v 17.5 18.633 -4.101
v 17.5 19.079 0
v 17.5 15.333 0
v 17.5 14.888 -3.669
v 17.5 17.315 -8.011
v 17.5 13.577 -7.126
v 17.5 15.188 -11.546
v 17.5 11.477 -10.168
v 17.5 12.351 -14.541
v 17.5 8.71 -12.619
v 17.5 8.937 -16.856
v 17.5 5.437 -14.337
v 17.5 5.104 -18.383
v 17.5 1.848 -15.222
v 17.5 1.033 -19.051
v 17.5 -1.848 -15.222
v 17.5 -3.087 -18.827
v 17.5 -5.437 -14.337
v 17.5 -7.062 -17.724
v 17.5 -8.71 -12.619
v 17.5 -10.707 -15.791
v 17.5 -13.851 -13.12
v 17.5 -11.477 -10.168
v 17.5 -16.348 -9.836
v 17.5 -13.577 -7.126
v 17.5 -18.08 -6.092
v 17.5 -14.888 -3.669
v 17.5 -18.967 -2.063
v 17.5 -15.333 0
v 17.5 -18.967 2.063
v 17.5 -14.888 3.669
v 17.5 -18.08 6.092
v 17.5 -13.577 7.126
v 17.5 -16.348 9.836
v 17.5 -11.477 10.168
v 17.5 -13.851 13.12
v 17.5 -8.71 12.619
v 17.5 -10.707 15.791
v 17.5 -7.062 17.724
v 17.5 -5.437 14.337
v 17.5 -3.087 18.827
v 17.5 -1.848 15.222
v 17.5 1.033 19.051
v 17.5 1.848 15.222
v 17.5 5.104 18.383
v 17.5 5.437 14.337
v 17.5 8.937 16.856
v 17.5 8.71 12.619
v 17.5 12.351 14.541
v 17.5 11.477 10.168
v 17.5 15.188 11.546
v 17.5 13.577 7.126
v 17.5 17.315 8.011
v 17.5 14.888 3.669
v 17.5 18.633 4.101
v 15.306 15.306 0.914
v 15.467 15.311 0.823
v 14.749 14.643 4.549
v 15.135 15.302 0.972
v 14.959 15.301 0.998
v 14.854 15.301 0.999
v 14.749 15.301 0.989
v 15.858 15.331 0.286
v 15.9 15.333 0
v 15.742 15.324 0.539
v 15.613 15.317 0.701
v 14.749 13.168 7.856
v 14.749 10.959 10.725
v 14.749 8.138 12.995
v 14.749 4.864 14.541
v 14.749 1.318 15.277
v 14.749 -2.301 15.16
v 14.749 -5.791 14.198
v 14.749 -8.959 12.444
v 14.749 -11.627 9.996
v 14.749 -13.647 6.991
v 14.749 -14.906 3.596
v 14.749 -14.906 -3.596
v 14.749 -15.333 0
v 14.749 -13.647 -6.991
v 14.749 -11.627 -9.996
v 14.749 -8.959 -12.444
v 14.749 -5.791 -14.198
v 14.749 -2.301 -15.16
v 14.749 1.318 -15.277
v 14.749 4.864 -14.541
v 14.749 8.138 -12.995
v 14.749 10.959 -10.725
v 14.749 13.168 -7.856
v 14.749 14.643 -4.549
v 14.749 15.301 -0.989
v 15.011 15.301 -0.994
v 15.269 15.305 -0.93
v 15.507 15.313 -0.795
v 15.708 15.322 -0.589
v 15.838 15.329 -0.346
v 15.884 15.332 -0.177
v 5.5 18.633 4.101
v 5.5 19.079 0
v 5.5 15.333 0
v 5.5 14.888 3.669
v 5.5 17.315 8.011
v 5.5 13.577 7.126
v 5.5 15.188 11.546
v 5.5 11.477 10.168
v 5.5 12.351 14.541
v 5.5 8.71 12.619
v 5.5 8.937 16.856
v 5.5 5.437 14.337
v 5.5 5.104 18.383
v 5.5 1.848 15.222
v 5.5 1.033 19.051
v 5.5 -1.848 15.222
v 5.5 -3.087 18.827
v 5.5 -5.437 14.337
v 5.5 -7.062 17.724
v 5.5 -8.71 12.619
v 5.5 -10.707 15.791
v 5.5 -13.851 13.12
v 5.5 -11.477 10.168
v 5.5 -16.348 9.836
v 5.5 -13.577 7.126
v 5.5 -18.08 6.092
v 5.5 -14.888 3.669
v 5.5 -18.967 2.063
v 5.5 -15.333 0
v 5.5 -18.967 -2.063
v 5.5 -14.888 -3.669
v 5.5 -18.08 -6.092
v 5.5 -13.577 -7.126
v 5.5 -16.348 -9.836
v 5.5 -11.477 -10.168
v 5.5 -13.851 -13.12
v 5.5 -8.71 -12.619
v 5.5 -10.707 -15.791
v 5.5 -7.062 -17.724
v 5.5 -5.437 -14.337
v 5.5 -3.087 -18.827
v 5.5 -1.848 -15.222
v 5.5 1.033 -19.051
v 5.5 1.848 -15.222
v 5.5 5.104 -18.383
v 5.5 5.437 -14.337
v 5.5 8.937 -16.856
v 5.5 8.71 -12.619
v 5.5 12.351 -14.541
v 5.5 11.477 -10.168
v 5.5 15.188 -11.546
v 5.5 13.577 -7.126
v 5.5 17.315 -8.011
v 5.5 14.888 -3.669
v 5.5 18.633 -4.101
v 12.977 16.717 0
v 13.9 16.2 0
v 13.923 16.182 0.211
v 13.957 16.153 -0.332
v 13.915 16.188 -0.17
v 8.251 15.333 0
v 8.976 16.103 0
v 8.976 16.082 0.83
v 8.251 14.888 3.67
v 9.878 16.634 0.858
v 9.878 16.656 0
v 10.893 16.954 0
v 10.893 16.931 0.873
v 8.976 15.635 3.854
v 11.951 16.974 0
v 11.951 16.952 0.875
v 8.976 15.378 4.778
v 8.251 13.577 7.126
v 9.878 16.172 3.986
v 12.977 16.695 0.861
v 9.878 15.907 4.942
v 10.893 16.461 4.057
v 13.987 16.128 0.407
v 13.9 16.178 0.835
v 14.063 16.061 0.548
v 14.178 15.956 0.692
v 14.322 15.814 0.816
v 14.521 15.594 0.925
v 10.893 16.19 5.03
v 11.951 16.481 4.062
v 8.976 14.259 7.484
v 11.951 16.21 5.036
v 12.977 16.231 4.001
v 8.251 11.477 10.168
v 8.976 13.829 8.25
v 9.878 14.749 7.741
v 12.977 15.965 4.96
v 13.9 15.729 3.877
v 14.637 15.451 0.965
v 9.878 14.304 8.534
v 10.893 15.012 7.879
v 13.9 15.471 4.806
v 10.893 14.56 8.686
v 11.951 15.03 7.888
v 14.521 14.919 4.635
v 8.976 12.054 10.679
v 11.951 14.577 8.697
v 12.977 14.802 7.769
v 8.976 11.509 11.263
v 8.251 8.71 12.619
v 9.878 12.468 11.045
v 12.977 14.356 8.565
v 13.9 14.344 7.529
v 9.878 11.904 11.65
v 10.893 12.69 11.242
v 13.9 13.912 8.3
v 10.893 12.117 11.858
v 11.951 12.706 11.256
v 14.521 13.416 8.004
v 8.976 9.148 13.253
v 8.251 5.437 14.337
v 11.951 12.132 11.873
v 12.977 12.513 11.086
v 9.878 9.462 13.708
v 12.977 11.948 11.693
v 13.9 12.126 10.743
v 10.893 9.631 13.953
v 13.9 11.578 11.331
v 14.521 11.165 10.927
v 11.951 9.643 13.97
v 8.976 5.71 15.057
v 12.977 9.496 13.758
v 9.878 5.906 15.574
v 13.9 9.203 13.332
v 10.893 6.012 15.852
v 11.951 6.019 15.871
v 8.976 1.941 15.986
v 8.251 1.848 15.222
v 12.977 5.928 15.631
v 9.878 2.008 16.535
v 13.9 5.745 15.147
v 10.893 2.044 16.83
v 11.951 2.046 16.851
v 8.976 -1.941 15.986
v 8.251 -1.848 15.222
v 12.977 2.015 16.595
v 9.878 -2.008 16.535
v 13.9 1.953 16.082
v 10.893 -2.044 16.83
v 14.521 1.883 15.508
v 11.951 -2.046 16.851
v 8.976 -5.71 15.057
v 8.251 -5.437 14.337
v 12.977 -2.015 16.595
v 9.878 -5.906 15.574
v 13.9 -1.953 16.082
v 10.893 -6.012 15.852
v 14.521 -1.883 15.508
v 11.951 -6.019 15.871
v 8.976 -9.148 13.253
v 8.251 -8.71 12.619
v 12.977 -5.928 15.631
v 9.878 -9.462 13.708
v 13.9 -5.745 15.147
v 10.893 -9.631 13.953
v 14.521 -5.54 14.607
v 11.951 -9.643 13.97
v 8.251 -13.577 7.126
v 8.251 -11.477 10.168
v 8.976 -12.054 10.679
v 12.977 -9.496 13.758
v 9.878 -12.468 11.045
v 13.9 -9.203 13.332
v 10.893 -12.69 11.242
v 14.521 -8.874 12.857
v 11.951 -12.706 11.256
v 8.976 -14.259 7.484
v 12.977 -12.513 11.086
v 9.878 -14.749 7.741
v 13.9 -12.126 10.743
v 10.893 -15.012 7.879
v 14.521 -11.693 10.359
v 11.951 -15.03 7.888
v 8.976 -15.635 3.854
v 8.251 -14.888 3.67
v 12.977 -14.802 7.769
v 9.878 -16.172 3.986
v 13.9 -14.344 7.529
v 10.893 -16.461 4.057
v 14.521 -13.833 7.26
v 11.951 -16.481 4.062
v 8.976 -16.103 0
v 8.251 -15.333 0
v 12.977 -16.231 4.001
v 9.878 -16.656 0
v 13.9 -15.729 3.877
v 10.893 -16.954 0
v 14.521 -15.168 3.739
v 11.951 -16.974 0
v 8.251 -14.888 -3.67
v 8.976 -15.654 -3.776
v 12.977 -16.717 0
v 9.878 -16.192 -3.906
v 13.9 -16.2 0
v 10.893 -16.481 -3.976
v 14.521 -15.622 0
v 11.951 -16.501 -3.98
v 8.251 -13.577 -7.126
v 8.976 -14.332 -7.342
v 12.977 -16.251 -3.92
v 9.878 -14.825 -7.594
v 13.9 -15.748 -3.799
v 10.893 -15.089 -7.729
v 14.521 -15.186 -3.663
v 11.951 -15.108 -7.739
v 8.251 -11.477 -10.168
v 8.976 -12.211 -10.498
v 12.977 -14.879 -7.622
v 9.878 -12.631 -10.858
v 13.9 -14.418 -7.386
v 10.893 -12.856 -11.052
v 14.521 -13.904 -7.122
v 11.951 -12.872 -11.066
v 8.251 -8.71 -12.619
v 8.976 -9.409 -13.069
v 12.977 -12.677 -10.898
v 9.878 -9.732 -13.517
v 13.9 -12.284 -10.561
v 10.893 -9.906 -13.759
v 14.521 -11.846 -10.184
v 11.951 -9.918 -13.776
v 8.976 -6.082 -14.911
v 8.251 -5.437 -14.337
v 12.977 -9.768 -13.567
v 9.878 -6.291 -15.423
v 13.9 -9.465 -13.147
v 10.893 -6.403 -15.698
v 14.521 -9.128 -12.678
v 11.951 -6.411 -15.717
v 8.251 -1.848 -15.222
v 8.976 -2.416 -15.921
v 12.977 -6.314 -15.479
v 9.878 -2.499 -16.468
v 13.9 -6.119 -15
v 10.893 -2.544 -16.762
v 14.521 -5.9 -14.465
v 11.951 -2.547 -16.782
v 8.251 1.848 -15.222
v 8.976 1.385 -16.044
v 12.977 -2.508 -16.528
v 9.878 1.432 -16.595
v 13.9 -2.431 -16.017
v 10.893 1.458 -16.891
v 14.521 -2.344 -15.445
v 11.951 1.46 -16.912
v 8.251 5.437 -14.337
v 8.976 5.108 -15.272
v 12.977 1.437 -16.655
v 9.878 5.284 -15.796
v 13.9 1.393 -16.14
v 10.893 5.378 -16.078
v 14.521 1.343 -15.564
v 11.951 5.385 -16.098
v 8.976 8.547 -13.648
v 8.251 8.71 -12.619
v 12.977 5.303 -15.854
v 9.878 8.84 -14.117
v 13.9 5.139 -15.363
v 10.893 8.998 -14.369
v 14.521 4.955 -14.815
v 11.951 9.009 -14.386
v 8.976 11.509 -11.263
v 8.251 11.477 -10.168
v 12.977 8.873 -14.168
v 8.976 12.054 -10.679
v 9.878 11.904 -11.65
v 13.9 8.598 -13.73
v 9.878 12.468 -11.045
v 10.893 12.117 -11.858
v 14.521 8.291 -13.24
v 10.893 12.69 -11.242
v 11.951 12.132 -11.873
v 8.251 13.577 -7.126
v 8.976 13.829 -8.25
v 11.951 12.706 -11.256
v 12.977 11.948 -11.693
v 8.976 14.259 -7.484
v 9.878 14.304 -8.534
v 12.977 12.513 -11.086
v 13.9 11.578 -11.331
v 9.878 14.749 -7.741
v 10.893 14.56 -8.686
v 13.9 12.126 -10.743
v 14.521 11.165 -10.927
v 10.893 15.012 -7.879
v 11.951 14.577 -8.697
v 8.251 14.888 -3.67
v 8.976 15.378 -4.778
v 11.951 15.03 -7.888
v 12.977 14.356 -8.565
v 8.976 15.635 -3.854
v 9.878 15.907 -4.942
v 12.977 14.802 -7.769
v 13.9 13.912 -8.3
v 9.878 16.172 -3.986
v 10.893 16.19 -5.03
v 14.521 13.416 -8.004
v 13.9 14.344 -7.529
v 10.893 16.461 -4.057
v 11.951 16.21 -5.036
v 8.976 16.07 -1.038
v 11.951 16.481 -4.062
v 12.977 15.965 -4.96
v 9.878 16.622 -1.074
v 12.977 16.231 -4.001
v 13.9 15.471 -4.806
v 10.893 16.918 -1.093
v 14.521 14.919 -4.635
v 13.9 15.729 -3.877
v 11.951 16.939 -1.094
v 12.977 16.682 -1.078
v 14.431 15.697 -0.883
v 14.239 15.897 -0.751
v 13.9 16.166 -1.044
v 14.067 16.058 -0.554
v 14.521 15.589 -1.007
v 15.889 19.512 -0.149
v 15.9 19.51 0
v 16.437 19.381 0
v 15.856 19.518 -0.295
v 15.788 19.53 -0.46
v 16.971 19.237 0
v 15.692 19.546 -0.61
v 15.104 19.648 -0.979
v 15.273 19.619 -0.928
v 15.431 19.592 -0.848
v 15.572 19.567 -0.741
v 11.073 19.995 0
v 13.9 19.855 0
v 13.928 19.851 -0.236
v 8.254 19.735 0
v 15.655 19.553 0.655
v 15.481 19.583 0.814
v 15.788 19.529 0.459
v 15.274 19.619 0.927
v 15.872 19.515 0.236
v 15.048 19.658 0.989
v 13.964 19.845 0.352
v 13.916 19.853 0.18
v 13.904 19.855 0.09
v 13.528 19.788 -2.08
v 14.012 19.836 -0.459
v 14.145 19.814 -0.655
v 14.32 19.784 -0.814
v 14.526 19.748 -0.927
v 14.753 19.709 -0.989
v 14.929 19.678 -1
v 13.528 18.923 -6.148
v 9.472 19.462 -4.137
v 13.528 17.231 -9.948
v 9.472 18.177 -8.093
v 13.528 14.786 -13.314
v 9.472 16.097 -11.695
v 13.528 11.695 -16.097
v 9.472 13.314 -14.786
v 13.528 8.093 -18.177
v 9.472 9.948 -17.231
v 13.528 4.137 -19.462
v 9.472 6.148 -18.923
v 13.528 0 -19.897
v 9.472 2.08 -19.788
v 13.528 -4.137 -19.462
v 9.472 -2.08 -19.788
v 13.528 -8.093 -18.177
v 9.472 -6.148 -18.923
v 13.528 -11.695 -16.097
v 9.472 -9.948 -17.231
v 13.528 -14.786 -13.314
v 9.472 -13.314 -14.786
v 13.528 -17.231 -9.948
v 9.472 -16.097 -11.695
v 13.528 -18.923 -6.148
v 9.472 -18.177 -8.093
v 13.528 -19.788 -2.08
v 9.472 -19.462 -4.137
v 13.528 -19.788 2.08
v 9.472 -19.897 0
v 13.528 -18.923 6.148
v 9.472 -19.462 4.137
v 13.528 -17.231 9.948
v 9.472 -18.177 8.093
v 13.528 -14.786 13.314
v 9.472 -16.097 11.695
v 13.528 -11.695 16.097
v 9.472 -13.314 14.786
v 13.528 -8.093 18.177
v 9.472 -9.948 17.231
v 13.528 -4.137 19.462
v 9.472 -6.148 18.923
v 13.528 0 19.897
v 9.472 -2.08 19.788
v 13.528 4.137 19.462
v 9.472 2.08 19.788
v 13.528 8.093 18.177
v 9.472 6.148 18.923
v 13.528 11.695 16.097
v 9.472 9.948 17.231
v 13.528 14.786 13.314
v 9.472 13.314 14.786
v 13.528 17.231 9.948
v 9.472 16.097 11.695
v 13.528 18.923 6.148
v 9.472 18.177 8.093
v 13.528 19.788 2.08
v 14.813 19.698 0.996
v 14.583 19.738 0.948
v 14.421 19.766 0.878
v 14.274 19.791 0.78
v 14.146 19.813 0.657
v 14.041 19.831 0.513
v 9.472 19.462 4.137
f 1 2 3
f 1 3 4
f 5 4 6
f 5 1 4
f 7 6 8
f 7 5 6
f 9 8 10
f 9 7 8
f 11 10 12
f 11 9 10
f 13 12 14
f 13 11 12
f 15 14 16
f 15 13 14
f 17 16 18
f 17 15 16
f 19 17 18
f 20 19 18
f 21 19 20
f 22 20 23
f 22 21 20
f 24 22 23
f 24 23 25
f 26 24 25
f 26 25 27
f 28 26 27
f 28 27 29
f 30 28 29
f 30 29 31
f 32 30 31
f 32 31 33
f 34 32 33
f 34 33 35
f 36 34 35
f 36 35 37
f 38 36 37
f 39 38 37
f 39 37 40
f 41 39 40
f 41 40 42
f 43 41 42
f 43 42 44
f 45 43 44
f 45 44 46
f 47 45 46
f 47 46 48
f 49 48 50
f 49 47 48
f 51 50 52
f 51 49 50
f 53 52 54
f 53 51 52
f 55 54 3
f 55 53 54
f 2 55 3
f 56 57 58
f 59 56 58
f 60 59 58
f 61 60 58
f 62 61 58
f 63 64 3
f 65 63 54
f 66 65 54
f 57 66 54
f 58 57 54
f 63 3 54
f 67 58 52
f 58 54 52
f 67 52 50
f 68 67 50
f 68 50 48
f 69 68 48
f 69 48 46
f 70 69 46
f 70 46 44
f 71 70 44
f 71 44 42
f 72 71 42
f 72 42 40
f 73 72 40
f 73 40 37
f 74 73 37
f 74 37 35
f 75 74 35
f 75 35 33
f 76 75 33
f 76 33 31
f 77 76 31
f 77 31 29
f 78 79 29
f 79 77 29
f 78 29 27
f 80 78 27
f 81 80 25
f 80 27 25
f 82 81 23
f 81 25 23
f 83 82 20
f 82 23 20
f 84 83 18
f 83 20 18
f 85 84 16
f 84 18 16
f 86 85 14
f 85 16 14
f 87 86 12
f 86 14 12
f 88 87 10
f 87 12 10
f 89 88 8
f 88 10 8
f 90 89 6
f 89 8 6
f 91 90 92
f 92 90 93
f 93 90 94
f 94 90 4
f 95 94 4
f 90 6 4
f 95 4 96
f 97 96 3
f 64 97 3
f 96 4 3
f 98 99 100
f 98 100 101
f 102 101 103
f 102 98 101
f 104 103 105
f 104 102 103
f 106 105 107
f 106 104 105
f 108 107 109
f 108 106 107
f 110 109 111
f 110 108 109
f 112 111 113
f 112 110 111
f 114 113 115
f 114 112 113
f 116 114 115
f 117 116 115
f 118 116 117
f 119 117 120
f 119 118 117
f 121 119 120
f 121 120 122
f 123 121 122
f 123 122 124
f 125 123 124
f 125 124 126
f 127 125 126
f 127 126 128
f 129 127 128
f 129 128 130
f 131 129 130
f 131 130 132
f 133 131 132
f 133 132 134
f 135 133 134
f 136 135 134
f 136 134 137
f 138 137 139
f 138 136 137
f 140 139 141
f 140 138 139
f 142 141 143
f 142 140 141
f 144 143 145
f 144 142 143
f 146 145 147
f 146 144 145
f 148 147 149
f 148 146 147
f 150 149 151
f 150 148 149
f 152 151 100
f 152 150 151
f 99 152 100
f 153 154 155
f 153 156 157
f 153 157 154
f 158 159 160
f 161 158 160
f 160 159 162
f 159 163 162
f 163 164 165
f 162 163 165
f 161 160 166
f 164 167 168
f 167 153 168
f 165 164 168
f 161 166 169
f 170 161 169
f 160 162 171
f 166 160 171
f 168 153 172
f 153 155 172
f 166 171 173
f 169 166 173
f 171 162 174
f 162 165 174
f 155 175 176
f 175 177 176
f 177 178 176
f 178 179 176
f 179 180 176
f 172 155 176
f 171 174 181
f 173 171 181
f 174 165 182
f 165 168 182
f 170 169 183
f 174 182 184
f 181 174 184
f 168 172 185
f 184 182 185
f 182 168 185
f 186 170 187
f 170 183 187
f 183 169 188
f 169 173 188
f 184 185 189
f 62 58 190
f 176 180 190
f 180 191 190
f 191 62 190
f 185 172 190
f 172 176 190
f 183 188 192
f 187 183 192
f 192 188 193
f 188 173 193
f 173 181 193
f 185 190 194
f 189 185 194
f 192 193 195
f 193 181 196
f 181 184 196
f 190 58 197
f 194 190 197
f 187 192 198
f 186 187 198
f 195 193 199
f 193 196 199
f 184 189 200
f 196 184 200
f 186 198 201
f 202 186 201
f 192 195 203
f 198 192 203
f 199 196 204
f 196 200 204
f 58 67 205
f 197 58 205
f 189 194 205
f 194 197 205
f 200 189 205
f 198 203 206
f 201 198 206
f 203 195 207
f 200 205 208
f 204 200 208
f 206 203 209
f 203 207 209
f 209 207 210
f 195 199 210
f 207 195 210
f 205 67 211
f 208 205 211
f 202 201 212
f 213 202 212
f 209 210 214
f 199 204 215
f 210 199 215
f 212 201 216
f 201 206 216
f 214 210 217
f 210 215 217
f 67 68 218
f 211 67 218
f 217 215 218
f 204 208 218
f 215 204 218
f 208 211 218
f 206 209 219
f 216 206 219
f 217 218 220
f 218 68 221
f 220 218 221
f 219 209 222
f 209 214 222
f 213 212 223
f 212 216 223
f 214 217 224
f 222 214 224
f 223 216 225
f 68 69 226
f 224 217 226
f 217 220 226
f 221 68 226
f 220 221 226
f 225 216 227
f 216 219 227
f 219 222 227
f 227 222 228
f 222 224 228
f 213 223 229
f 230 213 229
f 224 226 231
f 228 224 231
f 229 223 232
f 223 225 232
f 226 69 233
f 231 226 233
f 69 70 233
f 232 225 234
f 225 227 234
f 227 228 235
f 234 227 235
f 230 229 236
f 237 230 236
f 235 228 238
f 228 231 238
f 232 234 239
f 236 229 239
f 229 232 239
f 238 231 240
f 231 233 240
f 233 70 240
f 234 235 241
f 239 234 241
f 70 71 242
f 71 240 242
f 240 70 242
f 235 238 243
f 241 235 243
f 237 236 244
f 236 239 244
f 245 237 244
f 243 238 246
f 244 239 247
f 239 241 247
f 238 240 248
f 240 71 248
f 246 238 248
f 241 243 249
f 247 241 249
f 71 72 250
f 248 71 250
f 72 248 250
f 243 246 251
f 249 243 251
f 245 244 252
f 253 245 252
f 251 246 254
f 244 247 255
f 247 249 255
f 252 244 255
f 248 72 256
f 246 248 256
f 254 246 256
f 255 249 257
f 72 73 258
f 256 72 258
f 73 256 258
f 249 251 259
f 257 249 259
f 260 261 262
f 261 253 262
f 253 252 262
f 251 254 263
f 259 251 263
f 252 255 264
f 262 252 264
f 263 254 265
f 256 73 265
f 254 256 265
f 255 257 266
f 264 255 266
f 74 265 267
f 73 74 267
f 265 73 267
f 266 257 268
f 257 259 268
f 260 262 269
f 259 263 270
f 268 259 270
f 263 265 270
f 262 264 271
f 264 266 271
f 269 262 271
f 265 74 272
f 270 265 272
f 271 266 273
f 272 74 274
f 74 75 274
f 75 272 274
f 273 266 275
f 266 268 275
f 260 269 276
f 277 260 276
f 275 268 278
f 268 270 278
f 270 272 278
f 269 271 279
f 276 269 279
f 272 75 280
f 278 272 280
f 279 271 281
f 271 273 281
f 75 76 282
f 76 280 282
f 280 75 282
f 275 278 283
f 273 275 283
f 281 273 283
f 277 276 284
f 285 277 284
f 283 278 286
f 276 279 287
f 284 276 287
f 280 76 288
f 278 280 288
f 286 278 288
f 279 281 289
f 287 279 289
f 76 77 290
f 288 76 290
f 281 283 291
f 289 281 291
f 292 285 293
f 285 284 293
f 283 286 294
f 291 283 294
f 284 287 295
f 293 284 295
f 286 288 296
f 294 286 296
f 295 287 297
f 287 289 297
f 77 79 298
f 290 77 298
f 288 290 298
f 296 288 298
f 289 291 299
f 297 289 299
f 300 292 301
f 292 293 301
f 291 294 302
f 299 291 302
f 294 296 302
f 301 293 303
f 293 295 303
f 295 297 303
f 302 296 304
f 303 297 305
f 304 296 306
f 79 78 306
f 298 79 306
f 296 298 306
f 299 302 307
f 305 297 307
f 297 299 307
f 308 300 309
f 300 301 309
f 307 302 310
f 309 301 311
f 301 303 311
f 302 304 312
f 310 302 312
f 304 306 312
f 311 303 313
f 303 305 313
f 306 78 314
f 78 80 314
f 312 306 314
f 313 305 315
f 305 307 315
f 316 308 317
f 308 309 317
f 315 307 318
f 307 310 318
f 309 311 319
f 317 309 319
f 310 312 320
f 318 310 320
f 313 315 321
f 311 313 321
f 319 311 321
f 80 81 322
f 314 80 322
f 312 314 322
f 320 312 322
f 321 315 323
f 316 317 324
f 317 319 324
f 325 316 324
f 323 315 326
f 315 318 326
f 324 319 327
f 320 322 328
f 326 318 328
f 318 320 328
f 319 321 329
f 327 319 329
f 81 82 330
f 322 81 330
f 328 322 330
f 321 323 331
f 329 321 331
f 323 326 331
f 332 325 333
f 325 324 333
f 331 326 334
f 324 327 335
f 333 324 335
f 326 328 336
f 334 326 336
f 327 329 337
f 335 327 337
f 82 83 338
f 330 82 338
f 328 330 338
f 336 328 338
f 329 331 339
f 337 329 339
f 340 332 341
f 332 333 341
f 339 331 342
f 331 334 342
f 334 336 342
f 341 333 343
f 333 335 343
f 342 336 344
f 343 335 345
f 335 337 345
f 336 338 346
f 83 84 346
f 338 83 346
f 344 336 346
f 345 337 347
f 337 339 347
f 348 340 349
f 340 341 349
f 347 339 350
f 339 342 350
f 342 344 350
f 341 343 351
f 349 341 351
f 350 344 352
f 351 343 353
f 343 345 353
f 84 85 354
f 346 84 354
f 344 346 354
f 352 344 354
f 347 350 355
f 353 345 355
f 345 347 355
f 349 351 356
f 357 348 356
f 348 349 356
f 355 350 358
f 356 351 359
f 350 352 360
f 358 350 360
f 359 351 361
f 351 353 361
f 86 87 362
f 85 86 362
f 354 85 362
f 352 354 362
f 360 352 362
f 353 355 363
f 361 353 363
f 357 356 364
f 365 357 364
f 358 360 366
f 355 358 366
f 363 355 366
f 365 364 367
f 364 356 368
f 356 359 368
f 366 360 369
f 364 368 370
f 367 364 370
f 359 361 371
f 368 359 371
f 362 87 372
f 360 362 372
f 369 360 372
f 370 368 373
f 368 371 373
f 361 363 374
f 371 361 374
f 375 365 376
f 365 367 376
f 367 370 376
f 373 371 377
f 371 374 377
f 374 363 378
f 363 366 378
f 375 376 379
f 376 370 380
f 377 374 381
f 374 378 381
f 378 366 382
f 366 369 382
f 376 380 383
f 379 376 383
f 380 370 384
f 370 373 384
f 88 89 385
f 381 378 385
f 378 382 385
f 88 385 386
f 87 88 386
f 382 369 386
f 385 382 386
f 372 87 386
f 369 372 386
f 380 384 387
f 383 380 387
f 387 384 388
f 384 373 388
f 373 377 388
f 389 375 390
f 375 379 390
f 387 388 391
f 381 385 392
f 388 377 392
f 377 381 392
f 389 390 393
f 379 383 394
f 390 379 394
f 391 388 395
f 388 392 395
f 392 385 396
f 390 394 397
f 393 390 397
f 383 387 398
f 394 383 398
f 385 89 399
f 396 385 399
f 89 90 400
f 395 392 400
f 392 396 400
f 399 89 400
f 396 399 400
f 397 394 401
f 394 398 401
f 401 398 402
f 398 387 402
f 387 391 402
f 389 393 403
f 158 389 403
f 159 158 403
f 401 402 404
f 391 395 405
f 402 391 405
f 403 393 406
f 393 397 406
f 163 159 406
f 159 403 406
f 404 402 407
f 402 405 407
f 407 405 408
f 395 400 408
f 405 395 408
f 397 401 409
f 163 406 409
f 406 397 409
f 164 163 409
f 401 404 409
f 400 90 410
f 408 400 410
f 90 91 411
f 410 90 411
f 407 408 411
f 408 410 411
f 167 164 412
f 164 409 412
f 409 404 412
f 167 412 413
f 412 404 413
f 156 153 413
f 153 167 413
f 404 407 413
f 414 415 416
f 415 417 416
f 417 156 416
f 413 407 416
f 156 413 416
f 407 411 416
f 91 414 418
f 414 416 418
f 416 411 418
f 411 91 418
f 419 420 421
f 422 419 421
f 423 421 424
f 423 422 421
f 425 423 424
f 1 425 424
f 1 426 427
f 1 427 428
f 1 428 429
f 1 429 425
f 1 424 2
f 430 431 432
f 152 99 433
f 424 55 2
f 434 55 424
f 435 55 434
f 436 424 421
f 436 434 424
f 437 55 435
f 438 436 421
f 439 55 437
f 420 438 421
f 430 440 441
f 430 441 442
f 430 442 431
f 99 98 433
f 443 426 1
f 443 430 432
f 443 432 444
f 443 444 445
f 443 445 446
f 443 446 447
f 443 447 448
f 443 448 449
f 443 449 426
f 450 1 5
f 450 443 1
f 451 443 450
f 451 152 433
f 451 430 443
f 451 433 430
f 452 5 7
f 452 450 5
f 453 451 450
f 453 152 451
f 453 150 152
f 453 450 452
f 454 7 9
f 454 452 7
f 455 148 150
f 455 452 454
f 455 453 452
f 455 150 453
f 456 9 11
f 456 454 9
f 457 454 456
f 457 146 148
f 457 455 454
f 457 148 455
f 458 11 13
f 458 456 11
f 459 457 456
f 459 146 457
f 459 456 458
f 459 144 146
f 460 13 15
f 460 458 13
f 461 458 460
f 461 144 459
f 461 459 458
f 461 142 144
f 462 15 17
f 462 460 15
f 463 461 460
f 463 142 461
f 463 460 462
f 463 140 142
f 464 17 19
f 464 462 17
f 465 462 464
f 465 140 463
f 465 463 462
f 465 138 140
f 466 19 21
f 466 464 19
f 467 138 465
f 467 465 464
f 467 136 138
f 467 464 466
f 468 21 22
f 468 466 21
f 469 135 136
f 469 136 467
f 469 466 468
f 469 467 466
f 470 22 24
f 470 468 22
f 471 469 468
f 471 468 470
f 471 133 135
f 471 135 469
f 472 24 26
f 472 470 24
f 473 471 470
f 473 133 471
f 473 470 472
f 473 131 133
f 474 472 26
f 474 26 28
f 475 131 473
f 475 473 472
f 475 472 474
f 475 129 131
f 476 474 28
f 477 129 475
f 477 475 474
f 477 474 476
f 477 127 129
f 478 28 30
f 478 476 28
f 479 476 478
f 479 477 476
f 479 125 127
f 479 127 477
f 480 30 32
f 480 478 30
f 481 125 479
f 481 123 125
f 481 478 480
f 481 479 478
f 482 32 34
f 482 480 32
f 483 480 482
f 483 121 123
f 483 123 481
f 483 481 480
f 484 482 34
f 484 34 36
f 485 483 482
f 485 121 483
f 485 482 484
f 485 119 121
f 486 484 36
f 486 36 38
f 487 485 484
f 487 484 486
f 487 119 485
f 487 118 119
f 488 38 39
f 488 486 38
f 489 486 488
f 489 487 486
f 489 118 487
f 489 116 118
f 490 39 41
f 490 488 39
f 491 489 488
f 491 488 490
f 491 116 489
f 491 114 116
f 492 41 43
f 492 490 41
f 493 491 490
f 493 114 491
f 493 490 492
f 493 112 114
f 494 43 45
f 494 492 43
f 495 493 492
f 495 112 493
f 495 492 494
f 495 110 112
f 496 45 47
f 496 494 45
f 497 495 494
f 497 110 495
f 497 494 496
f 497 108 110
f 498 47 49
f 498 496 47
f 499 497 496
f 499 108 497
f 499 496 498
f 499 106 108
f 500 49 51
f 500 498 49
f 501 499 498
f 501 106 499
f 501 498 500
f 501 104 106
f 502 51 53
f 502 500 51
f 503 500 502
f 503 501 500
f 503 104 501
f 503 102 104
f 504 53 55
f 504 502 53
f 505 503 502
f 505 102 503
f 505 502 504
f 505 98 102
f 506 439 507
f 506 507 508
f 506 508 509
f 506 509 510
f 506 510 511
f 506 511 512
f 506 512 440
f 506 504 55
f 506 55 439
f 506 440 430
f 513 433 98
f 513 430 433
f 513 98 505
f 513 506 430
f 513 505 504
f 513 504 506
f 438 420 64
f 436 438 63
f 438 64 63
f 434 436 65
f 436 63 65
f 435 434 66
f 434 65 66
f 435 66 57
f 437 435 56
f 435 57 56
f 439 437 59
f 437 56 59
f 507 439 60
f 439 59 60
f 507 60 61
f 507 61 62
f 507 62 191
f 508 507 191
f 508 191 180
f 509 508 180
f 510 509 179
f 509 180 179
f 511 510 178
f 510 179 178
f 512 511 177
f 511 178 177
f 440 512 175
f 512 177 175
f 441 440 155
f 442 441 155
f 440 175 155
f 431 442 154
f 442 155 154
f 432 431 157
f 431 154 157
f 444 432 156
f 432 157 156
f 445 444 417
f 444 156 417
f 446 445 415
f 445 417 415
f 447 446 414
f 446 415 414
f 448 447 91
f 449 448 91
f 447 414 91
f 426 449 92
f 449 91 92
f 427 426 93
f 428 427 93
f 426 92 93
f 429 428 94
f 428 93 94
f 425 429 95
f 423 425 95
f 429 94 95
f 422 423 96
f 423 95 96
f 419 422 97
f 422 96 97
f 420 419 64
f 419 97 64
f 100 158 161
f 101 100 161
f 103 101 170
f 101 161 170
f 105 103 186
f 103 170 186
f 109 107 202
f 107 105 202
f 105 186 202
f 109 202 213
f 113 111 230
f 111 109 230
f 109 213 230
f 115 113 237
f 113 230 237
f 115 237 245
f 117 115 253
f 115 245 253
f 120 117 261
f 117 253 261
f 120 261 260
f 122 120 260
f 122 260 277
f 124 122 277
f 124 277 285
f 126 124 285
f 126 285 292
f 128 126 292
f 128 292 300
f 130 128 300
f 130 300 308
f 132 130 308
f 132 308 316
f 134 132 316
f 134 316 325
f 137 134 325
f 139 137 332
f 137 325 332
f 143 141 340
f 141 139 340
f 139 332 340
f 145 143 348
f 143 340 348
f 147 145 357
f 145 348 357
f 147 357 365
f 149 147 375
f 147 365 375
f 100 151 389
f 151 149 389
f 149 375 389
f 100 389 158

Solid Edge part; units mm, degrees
sketch "Sketch1" plane through (0, 0, 0) normal (0, 0, 1) x (1, 0, 0)
  line L0 (5.5, 19.0788) -> (5.5, 15.3333)
  line L1 (5.5, 15.3333) -> (8.2511, 15.3333)
  arc A0 (8.2511, 15.3333) -> (14.7489, 15.3333) centre (11.5, 13) cw
  line L2 (14.7489, 15.3333) -> (17.5, 15.3333)
  line L3 (17.5, 15.3333) -> (17.5, 19.0788)
  arc A1 (17.5, 19.0788) -> (5.5, 19.0788) centre (11.5, 0) ccw
revolve "RevolvedProtrusion1" add sketch "Sketch1" angle 360 about axis through (17.5, 0, 0) along (-1, 0, 0)
sketch "Sketch2" plane through (0, 0, 0) normal (0, -1, 0) x (1, 0, 0)
  circle A0 centre (14.9, 0) radius 1
extrude "Cutout1" cut sketch "Sketch2" against normal blind 40
properties part number "UCP201 GB/T7810-1995_PART1"
